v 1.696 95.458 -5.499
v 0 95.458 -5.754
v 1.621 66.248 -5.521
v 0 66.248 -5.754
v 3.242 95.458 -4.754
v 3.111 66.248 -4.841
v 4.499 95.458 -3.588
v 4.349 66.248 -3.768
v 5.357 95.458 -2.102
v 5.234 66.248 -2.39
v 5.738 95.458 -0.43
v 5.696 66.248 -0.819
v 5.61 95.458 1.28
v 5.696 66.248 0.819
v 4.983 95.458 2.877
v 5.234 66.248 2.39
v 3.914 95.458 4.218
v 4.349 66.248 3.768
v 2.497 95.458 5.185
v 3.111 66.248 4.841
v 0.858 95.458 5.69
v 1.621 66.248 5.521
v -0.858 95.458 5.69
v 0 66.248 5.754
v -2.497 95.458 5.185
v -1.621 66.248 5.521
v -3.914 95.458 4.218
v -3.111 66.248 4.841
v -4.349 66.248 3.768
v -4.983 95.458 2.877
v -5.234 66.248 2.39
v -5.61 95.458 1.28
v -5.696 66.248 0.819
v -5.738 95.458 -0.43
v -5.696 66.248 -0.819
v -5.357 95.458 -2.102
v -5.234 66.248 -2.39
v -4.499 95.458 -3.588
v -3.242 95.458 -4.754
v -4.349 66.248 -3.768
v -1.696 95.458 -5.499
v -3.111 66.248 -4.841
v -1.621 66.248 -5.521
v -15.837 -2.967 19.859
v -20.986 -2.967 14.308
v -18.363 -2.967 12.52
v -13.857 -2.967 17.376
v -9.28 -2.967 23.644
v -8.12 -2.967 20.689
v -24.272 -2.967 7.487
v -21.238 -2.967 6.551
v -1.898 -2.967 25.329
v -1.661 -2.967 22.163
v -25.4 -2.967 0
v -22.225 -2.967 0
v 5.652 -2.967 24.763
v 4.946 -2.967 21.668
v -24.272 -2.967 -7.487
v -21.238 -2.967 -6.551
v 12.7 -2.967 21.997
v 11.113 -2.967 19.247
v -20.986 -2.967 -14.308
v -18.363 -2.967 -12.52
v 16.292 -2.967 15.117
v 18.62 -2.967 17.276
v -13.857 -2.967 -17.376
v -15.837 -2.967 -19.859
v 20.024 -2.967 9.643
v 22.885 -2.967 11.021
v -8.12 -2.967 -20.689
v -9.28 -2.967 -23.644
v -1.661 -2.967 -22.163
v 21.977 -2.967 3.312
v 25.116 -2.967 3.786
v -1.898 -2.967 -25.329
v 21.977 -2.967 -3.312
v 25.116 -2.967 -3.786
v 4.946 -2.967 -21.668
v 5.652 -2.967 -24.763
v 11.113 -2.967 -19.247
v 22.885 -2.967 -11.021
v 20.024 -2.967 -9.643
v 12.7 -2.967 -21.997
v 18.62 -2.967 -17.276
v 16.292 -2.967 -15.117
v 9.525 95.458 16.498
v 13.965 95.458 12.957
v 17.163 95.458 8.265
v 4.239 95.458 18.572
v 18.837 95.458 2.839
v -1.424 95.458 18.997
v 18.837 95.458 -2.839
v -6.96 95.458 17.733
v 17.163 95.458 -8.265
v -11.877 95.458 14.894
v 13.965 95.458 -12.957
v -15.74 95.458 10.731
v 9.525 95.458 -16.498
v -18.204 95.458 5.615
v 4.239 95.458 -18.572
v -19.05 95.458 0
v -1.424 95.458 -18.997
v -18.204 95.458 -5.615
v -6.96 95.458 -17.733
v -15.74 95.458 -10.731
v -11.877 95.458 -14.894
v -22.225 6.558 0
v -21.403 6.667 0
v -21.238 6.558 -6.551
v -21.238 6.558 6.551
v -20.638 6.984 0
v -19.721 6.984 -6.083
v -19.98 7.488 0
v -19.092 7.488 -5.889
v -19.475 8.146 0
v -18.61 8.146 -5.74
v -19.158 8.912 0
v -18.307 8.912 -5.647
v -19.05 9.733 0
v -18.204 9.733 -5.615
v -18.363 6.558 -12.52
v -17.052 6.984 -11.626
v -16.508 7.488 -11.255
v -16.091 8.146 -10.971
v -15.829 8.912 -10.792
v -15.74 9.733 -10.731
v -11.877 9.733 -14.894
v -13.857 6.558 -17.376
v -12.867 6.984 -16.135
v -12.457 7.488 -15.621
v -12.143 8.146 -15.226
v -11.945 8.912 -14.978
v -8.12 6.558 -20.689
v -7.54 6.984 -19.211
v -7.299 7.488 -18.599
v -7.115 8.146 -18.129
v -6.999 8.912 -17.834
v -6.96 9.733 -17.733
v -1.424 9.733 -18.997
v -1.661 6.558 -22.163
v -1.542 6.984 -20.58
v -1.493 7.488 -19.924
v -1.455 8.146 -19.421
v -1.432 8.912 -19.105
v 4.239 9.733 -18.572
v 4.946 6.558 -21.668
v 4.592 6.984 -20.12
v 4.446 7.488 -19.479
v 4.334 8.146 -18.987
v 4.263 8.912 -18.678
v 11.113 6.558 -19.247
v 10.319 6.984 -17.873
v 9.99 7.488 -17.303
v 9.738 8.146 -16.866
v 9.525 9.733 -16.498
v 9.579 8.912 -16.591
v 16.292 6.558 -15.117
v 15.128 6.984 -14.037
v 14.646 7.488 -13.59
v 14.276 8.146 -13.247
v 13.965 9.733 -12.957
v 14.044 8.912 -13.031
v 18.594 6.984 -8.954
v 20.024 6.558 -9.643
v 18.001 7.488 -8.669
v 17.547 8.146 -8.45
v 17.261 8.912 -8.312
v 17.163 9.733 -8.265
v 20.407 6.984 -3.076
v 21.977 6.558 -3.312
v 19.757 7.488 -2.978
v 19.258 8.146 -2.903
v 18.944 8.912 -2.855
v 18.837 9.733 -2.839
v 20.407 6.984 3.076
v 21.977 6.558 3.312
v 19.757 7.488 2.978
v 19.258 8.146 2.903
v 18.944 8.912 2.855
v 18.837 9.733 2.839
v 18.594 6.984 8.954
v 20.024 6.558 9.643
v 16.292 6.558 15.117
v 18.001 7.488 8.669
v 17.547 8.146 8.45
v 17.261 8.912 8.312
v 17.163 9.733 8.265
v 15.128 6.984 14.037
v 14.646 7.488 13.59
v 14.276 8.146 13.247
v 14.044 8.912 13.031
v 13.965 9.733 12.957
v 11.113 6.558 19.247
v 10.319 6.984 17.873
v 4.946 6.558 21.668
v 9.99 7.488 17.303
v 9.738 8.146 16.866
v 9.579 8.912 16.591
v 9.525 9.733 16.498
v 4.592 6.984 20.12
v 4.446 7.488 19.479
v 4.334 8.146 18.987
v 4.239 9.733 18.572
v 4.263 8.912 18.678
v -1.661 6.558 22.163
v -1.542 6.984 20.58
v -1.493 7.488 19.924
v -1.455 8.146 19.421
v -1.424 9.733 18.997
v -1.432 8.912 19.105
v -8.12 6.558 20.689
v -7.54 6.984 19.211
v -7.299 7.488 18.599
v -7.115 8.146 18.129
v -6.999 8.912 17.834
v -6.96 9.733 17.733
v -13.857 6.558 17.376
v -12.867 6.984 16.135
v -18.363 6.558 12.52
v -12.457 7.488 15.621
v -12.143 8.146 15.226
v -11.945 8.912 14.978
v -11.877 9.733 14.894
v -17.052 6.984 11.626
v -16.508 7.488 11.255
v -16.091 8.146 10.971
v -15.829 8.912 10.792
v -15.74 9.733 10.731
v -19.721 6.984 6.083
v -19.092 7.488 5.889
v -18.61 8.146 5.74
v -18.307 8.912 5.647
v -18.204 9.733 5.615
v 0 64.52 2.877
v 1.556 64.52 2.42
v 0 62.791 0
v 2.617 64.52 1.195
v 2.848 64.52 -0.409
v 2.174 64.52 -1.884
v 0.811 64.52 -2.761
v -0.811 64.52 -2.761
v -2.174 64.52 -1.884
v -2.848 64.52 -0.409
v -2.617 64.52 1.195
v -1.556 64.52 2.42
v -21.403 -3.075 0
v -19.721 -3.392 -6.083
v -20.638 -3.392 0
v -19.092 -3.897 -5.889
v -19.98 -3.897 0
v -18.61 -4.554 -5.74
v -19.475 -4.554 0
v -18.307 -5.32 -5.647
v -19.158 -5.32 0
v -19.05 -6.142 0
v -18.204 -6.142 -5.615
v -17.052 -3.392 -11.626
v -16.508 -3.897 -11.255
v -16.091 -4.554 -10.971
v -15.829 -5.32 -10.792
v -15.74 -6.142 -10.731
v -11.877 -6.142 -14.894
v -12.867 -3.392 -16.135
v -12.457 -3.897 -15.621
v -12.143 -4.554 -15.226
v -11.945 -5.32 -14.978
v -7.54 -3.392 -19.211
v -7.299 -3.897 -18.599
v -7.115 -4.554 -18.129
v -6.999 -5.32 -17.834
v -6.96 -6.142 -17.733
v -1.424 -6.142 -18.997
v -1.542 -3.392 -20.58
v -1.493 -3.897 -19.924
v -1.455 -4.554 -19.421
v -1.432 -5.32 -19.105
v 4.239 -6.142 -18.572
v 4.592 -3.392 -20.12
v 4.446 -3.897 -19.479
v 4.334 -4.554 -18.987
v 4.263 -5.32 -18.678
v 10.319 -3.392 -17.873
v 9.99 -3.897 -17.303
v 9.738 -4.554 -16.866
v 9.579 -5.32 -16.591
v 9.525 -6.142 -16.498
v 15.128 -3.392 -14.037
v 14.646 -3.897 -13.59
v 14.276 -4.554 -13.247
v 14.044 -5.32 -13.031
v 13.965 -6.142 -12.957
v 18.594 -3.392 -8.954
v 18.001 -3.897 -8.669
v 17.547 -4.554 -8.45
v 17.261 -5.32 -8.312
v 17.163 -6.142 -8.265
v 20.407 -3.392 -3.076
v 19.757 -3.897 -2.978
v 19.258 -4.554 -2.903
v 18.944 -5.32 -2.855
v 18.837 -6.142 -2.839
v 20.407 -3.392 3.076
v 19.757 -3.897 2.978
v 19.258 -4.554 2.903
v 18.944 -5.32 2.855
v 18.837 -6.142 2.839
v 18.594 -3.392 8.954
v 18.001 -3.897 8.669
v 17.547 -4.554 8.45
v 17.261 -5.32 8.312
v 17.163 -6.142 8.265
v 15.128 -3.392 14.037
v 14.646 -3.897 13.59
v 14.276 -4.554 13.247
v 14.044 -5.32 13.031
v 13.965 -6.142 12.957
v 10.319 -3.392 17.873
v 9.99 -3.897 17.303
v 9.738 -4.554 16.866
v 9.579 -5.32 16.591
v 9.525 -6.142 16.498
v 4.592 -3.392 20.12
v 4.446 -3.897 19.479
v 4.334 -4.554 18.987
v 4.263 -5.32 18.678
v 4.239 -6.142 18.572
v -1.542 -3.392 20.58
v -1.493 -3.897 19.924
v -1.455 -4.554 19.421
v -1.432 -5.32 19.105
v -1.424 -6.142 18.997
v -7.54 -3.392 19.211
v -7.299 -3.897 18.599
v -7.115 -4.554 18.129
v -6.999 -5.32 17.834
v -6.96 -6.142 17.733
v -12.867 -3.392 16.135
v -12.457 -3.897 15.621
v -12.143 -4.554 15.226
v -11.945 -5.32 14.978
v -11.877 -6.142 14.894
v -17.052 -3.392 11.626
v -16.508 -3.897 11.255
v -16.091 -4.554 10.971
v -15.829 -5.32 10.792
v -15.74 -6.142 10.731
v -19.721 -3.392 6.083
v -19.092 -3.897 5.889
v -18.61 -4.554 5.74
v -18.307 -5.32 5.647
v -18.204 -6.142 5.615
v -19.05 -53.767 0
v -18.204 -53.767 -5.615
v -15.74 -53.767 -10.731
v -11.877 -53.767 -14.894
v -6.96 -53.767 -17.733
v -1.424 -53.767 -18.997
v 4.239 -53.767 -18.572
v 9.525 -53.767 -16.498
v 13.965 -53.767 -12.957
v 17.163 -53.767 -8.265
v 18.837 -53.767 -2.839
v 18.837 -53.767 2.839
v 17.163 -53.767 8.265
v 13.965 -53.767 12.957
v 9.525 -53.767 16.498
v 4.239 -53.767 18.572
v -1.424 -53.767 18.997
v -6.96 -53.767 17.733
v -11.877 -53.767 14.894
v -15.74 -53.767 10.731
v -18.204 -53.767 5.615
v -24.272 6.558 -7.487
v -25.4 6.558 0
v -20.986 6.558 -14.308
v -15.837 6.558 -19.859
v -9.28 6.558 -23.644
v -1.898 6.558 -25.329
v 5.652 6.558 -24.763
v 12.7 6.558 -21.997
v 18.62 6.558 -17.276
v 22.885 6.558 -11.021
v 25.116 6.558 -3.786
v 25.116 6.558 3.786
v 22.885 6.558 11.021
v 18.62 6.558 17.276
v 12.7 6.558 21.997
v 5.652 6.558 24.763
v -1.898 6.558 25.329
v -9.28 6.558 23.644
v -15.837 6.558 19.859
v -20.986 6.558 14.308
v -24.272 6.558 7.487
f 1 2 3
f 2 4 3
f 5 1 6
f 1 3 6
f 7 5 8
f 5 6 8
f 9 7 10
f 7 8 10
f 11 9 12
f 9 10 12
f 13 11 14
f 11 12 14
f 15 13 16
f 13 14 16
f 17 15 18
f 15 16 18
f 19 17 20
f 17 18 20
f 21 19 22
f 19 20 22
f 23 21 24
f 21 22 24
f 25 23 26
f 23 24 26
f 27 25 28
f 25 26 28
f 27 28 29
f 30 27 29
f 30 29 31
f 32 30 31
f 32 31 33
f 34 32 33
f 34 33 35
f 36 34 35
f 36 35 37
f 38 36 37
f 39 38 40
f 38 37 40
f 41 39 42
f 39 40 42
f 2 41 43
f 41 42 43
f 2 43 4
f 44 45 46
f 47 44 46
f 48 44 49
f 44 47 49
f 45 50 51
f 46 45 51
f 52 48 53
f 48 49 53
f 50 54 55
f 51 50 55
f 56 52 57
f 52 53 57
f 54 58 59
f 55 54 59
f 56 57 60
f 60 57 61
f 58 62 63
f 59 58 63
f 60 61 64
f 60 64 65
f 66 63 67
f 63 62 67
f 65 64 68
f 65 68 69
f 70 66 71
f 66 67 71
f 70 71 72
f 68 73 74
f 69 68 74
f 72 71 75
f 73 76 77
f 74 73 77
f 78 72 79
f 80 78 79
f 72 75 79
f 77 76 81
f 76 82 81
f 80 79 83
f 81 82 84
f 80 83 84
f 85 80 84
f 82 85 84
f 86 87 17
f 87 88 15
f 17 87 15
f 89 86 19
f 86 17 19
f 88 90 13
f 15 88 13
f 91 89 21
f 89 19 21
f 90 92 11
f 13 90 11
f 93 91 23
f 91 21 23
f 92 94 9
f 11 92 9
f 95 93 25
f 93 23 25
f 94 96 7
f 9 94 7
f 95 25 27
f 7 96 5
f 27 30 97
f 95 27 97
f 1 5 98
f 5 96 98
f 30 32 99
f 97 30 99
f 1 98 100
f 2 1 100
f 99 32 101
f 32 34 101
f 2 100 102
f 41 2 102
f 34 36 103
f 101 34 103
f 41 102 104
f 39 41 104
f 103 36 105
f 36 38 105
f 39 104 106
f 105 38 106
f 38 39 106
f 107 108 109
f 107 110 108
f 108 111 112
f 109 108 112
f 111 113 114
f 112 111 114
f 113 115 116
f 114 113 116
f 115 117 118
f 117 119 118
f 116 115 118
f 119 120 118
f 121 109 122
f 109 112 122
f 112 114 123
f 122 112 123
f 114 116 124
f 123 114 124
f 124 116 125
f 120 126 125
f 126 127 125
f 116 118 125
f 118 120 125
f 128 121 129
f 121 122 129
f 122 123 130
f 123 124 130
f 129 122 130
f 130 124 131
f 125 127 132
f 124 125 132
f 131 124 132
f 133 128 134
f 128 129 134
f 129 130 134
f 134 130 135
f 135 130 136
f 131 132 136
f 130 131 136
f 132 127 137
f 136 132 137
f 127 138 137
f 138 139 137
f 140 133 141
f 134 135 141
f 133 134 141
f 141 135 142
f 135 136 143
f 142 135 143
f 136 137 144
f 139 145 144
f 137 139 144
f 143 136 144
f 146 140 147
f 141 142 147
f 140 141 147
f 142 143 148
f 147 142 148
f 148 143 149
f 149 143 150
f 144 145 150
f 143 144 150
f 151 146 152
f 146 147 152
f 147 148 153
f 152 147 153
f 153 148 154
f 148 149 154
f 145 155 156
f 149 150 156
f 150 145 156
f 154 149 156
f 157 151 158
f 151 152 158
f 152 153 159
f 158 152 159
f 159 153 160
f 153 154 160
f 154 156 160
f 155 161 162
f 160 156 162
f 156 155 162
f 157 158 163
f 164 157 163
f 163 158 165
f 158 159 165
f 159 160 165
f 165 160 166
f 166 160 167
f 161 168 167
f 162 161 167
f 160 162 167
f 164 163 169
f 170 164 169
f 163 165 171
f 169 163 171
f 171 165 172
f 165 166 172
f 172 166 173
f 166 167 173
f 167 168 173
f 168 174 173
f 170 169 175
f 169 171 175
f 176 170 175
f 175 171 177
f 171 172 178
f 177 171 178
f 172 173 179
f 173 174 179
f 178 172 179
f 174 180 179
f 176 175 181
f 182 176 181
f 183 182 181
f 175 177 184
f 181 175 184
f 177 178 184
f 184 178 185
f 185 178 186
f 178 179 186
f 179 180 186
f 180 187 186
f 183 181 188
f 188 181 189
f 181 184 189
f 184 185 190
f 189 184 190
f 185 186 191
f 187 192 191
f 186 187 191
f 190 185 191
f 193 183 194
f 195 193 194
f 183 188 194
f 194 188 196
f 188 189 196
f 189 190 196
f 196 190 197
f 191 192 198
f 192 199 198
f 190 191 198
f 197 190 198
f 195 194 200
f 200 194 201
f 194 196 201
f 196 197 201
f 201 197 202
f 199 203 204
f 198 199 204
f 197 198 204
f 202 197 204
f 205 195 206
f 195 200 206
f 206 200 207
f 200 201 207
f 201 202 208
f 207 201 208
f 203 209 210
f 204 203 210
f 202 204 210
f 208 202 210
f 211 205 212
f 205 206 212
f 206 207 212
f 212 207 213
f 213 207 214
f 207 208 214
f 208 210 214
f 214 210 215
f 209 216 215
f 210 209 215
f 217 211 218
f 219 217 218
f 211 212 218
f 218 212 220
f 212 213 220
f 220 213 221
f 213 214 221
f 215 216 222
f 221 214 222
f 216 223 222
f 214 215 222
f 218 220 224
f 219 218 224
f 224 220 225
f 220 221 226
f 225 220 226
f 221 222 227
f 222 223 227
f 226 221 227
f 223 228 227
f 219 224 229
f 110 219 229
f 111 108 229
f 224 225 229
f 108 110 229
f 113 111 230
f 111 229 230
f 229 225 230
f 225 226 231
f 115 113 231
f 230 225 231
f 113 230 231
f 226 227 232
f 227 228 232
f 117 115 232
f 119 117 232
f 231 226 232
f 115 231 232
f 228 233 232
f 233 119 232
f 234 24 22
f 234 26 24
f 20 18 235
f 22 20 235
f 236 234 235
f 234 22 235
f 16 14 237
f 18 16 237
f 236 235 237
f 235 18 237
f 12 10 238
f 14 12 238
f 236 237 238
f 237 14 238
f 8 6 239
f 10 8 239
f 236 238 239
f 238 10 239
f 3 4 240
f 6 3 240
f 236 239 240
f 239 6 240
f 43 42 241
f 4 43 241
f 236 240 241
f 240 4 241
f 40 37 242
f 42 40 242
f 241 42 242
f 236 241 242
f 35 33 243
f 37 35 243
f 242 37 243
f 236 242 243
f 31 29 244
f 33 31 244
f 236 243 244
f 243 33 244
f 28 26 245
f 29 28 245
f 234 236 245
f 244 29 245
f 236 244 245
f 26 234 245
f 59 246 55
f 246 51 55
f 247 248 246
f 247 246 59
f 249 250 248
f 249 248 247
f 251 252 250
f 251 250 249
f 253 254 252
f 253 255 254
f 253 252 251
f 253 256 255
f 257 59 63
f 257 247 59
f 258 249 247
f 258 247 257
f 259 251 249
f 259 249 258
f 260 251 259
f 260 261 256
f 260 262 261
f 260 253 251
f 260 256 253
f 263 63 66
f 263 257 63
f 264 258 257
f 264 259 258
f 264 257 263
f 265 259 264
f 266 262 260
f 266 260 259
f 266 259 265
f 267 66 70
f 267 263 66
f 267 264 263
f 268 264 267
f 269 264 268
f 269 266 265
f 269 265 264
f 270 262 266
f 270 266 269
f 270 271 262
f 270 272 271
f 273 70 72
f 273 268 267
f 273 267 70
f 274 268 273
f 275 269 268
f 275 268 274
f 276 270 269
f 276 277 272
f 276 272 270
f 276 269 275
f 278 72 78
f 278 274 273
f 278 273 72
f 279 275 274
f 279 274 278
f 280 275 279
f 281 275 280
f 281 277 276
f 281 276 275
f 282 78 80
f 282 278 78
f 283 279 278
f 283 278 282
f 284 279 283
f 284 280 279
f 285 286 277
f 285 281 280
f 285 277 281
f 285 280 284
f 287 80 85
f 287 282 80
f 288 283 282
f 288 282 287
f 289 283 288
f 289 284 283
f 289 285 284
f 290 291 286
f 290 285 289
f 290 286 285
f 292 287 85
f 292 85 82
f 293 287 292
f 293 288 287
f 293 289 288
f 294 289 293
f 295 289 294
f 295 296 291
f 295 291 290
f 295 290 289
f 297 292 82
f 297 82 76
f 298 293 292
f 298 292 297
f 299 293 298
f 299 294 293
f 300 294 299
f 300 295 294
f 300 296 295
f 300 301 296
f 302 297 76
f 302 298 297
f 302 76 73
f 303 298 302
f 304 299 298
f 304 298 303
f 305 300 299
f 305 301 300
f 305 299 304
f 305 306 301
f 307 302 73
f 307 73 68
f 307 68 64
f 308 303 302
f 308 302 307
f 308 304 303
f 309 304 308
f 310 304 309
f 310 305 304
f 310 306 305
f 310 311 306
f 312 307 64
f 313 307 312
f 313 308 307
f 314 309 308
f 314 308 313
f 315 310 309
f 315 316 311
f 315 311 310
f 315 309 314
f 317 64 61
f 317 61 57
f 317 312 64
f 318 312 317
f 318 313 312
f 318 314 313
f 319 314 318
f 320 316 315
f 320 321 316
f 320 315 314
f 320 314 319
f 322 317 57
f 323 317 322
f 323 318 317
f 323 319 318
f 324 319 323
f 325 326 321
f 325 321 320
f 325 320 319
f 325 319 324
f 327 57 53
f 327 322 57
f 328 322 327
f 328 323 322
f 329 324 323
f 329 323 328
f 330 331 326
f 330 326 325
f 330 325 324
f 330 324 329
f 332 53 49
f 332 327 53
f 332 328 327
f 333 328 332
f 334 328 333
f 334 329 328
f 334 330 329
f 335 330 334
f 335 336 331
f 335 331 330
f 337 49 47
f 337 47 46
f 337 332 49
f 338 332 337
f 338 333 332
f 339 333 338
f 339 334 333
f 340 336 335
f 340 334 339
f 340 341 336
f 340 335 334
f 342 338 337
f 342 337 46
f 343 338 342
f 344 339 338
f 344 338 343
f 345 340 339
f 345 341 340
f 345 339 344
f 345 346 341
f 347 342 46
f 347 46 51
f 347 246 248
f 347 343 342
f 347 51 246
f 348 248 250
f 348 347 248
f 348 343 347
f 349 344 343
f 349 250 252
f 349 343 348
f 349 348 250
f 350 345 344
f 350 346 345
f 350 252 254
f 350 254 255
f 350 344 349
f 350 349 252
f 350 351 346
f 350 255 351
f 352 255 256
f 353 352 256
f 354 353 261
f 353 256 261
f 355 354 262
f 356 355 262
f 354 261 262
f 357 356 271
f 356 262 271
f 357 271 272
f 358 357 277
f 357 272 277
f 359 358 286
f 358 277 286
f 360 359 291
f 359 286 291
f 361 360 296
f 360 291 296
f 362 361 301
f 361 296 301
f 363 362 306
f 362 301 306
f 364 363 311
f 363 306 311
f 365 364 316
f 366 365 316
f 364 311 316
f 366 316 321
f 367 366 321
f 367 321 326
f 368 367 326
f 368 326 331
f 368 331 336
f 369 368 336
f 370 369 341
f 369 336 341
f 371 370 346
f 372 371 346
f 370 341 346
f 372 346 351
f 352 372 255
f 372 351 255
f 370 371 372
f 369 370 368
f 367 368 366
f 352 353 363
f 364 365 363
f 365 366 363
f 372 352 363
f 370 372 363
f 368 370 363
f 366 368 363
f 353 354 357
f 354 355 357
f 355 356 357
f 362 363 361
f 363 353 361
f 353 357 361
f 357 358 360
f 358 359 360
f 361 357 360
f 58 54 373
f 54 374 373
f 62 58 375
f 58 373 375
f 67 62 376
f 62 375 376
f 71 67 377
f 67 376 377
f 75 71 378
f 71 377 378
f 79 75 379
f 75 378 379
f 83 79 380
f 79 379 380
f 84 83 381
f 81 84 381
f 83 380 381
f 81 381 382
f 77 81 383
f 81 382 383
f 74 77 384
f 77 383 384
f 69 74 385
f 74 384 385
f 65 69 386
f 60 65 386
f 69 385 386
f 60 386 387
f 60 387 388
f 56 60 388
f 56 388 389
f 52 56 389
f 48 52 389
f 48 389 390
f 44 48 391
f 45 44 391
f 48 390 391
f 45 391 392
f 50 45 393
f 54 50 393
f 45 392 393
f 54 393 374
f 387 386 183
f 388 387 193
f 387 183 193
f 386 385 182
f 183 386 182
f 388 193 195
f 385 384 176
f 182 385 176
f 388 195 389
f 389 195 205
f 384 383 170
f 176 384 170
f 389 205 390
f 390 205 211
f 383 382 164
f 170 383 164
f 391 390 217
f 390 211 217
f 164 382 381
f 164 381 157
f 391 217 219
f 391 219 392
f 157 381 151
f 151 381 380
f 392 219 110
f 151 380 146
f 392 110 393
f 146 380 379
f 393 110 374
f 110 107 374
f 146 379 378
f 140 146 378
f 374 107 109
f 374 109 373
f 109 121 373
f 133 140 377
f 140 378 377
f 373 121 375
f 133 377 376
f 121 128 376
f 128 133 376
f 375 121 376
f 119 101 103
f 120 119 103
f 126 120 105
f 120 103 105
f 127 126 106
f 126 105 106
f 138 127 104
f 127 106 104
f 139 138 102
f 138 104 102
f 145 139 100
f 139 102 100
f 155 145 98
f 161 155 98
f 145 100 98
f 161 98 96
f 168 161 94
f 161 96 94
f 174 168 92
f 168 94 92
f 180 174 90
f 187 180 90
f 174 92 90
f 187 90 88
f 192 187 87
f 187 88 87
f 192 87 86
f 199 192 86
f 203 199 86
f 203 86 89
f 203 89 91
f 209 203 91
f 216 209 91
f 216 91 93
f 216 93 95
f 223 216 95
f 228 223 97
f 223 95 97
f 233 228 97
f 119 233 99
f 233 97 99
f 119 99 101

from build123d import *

# Parameters (mm, degrees)
F_1_2_20_TAPPED_HOLE1_D     = 11.50874
F_1_2_20_TAPPED_HOLE1_DEPTH = 29.21
F_1_2_20_TAPPED_HOLE1_TIP   = 3.45757432
FILLET1_R                   = 3.175


with BuildPart() as part:
    # Sketch1 → Revolve2 (revolve)
    with BuildSketch(Plane.XY):
        Polygon((-25.4, -2.966632853), (-25.4, 6.558367147), (-19.05, 6.558367147), (-19.05, 95.458367147), (0, 95.458367147), (0, 0), (0, -53.766632853), (-19.05, -53.766632853), (-19.05, -2.966632853), align=None)
    revolve(axis=Axis((0, 95.458367147, 0), (0, -1, 0)))

    # 1/2-20 Tapped Hole1
    with Locations(Plane.ZX.offset(95.458367147)):
        with Locations((0, 0)):
            Hole(F_1_2_20_TAPPED_HOLE1_D / 2, depth=F_1_2_20_TAPPED_HOLE1_DEPTH)
            with Locations((0, 0, -(F_1_2_20_TAPPED_HOLE1_DEPTH + F_1_2_20_TAPPED_HOLE1_TIP / 2))):  # 118° drill point
                Cone(0, F_1_2_20_TAPPED_HOLE1_D / 2, F_1_2_20_TAPPED_HOLE1_TIP, mode=Mode.SUBTRACT)

    # Fillet1
    fillet1_edges = [part.edges().sort_by_distance(p)[0] for p in [
        (19.05, 6.558367147, 0),
        (19.05, -2.966632853, 0),
    ]]
    fillet(fillet1_edges, radius=FILLET1_R)


solid = part.part
